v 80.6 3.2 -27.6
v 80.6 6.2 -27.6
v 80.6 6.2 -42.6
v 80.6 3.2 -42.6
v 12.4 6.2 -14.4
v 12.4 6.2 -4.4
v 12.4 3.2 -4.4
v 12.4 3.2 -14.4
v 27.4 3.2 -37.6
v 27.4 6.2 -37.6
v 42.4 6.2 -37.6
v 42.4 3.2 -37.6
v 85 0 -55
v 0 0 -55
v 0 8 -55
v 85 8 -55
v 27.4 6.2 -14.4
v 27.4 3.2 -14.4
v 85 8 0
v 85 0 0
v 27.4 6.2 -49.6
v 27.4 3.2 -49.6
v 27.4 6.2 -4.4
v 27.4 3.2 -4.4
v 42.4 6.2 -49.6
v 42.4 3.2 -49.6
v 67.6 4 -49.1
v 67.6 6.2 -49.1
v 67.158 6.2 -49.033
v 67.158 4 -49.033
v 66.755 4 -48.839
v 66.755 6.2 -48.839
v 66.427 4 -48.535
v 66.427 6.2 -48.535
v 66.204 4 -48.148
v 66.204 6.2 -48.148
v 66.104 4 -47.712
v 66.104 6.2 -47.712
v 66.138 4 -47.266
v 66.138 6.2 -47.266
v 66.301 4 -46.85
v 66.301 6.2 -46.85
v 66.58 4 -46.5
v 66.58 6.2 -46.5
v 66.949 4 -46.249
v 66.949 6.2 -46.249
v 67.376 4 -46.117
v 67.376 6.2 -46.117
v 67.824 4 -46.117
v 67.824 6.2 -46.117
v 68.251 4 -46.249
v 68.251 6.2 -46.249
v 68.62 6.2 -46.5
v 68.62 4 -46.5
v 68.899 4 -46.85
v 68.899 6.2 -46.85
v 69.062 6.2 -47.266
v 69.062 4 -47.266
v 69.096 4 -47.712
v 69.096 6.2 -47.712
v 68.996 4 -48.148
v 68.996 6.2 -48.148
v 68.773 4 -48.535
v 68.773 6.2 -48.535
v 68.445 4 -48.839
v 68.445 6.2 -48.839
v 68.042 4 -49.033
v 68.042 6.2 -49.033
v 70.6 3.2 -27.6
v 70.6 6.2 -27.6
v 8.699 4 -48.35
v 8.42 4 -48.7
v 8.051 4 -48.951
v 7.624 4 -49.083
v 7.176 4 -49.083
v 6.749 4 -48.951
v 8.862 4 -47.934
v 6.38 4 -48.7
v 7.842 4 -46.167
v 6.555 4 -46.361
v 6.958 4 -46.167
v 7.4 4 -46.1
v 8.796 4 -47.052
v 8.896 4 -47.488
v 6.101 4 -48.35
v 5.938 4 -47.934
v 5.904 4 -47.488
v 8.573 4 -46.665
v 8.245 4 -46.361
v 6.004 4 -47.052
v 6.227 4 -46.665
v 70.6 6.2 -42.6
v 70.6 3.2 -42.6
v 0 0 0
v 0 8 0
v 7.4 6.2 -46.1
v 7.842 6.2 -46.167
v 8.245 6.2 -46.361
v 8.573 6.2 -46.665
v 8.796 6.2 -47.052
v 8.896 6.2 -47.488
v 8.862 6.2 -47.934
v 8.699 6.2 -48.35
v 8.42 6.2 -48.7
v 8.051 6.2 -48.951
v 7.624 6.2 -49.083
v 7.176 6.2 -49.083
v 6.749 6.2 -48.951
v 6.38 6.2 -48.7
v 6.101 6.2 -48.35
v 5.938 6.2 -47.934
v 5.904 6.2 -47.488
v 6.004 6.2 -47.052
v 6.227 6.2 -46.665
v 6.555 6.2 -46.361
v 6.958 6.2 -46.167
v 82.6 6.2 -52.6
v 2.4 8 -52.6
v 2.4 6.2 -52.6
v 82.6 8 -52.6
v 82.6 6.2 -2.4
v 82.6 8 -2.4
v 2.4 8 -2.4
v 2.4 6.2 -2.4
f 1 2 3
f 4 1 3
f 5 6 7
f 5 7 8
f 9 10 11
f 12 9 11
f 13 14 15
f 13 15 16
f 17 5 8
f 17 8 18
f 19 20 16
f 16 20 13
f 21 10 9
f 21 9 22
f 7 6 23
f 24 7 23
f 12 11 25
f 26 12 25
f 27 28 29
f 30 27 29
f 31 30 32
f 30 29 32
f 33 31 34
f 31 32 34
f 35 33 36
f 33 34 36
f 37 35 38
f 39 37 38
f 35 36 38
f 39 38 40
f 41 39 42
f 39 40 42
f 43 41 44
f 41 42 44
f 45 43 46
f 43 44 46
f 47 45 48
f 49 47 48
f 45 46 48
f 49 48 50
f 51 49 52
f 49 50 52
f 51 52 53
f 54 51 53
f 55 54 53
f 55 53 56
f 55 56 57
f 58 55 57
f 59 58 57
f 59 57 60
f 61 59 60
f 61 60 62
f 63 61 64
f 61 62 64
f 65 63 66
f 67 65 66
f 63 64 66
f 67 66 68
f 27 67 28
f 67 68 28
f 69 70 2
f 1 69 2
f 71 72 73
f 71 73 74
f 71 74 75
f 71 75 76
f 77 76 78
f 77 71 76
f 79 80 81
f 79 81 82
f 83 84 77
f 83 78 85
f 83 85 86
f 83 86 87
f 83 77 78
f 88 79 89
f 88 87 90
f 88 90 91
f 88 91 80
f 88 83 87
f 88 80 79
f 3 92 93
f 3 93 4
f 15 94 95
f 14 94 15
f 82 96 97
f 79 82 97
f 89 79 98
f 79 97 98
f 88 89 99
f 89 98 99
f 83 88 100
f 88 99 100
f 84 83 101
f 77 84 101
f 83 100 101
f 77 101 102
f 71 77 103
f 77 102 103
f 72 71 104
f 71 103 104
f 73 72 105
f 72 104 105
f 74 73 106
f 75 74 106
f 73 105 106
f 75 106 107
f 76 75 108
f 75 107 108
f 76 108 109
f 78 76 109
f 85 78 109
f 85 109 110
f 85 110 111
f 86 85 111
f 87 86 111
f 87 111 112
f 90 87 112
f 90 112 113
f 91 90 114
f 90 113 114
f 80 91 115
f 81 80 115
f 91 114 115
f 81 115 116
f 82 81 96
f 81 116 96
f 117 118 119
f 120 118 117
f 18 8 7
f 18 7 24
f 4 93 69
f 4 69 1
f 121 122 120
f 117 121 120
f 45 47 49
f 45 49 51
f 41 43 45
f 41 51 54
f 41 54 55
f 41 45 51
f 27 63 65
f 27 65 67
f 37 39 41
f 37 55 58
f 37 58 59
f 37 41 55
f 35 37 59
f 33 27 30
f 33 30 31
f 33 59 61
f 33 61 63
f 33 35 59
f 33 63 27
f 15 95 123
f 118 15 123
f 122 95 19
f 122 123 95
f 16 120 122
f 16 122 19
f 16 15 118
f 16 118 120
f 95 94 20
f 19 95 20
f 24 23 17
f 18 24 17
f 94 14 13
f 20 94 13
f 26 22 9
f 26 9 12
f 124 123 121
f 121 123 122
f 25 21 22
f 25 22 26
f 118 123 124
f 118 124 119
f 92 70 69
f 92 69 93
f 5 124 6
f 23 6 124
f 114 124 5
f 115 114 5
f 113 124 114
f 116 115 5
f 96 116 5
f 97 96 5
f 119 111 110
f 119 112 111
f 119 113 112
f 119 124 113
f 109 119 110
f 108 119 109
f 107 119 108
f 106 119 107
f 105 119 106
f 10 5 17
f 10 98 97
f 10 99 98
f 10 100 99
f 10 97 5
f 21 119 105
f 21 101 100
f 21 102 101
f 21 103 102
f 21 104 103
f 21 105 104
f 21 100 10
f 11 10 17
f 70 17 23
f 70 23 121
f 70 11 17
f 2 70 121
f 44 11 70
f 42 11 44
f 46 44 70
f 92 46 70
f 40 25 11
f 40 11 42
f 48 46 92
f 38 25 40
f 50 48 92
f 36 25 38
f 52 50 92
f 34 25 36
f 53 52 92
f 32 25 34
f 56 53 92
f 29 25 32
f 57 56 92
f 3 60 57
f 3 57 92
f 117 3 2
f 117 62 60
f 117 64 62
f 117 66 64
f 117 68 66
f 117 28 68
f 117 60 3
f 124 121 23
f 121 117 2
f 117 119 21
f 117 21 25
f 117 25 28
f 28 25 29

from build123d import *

# Parameters (mm, degrees)
SKETCH_2_W          = 85
SKETCH_2_H          = 55
EXTRUDE_3_DEPTH     = 8
SKETCH_5_W          = 80.2
SKETCH_5_H          = 50.2
CUT_EXTRUDE_1_DEPTH = 1.8
SKETCH_7_R          = 1.5
CUT_EXTRUDE_4_DEPTH = 2.2
SKETCH_8_W          = 15
SKETCH_8_H          = 10
SKETCH_8_W_2        = 10
SKETCH_8_H_2        = 15
SKETCH_8_H_3        = 12
CUT_EXTRUDE_6_DEPTH = 3


with BuildPart() as part:
    # 草图2 → 凸台-拉伸3 (new body)
    with BuildSketch(Plane(origin=(0, 0, 0), x_dir=(1, 0, 0), z_dir=(0, 1, 0))):
        with Locations((42.5, 27.5)):
            Rectangle(SKETCH_2_W, SKETCH_2_H)
    extrude(amount=EXTRUDE_3_DEPTH)

    # 草图5 → 切除-拉伸1 (cut)
    with BuildSketch(Plane(origin=(0, 8, 0), x_dir=(1, 0, 0), z_dir=(0, 1, 0))):
        with Locations((42.5, 27.5)):
            Rectangle(SKETCH_5_W, SKETCH_5_H)
    extrude(amount=-CUT_EXTRUDE_1_DEPTH, mode=Mode.SUBTRACT)

    # 草图7 → 切除-拉伸4 (cut)
    with BuildSketch(Plane(origin=(0, 6.2, 0), x_dir=(1, 0, 0), z_dir=(0, 1, 0))):
        with Locations(Location((7.4, 47.6, 0), (0, 0, 270))):
            Circle(SKETCH_7_R)
        with Locations(Location((67.6, 47.6, 0), (0, 0, 90))):
            Circle(SKETCH_7_R)
        with Locations((7.4, -2.6)):
            Circle(SKETCH_7_R)
        with Locations((67.6, -2.6)):
            Circle(SKETCH_7_R)
    extrude(amount=-CUT_EXTRUDE_4_DEPTH, mode=Mode.SUBTRACT)

    # 草图8 → 切除-拉伸6 (cut)
    with BuildSketch(Plane(origin=(0, 6.2, 0), x_dir=(1, 0, 0), z_dir=(0, 1, 0))):
        with Locations((19.9, 9.4)):
            Rectangle(SKETCH_8_W, SKETCH_8_H)
        with Locations((75.6, 35.1)):
            Rectangle(SKETCH_8_W_2, SKETCH_8_H_2)
        with Locations((34.9, 43.6)):
            Rectangle(SKETCH_8_W, SKETCH_8_H_3)
    extrude(amount=-CUT_EXTRUDE_6_DEPTH, mode=Mode.SUBTRACT)


solid = part.part
